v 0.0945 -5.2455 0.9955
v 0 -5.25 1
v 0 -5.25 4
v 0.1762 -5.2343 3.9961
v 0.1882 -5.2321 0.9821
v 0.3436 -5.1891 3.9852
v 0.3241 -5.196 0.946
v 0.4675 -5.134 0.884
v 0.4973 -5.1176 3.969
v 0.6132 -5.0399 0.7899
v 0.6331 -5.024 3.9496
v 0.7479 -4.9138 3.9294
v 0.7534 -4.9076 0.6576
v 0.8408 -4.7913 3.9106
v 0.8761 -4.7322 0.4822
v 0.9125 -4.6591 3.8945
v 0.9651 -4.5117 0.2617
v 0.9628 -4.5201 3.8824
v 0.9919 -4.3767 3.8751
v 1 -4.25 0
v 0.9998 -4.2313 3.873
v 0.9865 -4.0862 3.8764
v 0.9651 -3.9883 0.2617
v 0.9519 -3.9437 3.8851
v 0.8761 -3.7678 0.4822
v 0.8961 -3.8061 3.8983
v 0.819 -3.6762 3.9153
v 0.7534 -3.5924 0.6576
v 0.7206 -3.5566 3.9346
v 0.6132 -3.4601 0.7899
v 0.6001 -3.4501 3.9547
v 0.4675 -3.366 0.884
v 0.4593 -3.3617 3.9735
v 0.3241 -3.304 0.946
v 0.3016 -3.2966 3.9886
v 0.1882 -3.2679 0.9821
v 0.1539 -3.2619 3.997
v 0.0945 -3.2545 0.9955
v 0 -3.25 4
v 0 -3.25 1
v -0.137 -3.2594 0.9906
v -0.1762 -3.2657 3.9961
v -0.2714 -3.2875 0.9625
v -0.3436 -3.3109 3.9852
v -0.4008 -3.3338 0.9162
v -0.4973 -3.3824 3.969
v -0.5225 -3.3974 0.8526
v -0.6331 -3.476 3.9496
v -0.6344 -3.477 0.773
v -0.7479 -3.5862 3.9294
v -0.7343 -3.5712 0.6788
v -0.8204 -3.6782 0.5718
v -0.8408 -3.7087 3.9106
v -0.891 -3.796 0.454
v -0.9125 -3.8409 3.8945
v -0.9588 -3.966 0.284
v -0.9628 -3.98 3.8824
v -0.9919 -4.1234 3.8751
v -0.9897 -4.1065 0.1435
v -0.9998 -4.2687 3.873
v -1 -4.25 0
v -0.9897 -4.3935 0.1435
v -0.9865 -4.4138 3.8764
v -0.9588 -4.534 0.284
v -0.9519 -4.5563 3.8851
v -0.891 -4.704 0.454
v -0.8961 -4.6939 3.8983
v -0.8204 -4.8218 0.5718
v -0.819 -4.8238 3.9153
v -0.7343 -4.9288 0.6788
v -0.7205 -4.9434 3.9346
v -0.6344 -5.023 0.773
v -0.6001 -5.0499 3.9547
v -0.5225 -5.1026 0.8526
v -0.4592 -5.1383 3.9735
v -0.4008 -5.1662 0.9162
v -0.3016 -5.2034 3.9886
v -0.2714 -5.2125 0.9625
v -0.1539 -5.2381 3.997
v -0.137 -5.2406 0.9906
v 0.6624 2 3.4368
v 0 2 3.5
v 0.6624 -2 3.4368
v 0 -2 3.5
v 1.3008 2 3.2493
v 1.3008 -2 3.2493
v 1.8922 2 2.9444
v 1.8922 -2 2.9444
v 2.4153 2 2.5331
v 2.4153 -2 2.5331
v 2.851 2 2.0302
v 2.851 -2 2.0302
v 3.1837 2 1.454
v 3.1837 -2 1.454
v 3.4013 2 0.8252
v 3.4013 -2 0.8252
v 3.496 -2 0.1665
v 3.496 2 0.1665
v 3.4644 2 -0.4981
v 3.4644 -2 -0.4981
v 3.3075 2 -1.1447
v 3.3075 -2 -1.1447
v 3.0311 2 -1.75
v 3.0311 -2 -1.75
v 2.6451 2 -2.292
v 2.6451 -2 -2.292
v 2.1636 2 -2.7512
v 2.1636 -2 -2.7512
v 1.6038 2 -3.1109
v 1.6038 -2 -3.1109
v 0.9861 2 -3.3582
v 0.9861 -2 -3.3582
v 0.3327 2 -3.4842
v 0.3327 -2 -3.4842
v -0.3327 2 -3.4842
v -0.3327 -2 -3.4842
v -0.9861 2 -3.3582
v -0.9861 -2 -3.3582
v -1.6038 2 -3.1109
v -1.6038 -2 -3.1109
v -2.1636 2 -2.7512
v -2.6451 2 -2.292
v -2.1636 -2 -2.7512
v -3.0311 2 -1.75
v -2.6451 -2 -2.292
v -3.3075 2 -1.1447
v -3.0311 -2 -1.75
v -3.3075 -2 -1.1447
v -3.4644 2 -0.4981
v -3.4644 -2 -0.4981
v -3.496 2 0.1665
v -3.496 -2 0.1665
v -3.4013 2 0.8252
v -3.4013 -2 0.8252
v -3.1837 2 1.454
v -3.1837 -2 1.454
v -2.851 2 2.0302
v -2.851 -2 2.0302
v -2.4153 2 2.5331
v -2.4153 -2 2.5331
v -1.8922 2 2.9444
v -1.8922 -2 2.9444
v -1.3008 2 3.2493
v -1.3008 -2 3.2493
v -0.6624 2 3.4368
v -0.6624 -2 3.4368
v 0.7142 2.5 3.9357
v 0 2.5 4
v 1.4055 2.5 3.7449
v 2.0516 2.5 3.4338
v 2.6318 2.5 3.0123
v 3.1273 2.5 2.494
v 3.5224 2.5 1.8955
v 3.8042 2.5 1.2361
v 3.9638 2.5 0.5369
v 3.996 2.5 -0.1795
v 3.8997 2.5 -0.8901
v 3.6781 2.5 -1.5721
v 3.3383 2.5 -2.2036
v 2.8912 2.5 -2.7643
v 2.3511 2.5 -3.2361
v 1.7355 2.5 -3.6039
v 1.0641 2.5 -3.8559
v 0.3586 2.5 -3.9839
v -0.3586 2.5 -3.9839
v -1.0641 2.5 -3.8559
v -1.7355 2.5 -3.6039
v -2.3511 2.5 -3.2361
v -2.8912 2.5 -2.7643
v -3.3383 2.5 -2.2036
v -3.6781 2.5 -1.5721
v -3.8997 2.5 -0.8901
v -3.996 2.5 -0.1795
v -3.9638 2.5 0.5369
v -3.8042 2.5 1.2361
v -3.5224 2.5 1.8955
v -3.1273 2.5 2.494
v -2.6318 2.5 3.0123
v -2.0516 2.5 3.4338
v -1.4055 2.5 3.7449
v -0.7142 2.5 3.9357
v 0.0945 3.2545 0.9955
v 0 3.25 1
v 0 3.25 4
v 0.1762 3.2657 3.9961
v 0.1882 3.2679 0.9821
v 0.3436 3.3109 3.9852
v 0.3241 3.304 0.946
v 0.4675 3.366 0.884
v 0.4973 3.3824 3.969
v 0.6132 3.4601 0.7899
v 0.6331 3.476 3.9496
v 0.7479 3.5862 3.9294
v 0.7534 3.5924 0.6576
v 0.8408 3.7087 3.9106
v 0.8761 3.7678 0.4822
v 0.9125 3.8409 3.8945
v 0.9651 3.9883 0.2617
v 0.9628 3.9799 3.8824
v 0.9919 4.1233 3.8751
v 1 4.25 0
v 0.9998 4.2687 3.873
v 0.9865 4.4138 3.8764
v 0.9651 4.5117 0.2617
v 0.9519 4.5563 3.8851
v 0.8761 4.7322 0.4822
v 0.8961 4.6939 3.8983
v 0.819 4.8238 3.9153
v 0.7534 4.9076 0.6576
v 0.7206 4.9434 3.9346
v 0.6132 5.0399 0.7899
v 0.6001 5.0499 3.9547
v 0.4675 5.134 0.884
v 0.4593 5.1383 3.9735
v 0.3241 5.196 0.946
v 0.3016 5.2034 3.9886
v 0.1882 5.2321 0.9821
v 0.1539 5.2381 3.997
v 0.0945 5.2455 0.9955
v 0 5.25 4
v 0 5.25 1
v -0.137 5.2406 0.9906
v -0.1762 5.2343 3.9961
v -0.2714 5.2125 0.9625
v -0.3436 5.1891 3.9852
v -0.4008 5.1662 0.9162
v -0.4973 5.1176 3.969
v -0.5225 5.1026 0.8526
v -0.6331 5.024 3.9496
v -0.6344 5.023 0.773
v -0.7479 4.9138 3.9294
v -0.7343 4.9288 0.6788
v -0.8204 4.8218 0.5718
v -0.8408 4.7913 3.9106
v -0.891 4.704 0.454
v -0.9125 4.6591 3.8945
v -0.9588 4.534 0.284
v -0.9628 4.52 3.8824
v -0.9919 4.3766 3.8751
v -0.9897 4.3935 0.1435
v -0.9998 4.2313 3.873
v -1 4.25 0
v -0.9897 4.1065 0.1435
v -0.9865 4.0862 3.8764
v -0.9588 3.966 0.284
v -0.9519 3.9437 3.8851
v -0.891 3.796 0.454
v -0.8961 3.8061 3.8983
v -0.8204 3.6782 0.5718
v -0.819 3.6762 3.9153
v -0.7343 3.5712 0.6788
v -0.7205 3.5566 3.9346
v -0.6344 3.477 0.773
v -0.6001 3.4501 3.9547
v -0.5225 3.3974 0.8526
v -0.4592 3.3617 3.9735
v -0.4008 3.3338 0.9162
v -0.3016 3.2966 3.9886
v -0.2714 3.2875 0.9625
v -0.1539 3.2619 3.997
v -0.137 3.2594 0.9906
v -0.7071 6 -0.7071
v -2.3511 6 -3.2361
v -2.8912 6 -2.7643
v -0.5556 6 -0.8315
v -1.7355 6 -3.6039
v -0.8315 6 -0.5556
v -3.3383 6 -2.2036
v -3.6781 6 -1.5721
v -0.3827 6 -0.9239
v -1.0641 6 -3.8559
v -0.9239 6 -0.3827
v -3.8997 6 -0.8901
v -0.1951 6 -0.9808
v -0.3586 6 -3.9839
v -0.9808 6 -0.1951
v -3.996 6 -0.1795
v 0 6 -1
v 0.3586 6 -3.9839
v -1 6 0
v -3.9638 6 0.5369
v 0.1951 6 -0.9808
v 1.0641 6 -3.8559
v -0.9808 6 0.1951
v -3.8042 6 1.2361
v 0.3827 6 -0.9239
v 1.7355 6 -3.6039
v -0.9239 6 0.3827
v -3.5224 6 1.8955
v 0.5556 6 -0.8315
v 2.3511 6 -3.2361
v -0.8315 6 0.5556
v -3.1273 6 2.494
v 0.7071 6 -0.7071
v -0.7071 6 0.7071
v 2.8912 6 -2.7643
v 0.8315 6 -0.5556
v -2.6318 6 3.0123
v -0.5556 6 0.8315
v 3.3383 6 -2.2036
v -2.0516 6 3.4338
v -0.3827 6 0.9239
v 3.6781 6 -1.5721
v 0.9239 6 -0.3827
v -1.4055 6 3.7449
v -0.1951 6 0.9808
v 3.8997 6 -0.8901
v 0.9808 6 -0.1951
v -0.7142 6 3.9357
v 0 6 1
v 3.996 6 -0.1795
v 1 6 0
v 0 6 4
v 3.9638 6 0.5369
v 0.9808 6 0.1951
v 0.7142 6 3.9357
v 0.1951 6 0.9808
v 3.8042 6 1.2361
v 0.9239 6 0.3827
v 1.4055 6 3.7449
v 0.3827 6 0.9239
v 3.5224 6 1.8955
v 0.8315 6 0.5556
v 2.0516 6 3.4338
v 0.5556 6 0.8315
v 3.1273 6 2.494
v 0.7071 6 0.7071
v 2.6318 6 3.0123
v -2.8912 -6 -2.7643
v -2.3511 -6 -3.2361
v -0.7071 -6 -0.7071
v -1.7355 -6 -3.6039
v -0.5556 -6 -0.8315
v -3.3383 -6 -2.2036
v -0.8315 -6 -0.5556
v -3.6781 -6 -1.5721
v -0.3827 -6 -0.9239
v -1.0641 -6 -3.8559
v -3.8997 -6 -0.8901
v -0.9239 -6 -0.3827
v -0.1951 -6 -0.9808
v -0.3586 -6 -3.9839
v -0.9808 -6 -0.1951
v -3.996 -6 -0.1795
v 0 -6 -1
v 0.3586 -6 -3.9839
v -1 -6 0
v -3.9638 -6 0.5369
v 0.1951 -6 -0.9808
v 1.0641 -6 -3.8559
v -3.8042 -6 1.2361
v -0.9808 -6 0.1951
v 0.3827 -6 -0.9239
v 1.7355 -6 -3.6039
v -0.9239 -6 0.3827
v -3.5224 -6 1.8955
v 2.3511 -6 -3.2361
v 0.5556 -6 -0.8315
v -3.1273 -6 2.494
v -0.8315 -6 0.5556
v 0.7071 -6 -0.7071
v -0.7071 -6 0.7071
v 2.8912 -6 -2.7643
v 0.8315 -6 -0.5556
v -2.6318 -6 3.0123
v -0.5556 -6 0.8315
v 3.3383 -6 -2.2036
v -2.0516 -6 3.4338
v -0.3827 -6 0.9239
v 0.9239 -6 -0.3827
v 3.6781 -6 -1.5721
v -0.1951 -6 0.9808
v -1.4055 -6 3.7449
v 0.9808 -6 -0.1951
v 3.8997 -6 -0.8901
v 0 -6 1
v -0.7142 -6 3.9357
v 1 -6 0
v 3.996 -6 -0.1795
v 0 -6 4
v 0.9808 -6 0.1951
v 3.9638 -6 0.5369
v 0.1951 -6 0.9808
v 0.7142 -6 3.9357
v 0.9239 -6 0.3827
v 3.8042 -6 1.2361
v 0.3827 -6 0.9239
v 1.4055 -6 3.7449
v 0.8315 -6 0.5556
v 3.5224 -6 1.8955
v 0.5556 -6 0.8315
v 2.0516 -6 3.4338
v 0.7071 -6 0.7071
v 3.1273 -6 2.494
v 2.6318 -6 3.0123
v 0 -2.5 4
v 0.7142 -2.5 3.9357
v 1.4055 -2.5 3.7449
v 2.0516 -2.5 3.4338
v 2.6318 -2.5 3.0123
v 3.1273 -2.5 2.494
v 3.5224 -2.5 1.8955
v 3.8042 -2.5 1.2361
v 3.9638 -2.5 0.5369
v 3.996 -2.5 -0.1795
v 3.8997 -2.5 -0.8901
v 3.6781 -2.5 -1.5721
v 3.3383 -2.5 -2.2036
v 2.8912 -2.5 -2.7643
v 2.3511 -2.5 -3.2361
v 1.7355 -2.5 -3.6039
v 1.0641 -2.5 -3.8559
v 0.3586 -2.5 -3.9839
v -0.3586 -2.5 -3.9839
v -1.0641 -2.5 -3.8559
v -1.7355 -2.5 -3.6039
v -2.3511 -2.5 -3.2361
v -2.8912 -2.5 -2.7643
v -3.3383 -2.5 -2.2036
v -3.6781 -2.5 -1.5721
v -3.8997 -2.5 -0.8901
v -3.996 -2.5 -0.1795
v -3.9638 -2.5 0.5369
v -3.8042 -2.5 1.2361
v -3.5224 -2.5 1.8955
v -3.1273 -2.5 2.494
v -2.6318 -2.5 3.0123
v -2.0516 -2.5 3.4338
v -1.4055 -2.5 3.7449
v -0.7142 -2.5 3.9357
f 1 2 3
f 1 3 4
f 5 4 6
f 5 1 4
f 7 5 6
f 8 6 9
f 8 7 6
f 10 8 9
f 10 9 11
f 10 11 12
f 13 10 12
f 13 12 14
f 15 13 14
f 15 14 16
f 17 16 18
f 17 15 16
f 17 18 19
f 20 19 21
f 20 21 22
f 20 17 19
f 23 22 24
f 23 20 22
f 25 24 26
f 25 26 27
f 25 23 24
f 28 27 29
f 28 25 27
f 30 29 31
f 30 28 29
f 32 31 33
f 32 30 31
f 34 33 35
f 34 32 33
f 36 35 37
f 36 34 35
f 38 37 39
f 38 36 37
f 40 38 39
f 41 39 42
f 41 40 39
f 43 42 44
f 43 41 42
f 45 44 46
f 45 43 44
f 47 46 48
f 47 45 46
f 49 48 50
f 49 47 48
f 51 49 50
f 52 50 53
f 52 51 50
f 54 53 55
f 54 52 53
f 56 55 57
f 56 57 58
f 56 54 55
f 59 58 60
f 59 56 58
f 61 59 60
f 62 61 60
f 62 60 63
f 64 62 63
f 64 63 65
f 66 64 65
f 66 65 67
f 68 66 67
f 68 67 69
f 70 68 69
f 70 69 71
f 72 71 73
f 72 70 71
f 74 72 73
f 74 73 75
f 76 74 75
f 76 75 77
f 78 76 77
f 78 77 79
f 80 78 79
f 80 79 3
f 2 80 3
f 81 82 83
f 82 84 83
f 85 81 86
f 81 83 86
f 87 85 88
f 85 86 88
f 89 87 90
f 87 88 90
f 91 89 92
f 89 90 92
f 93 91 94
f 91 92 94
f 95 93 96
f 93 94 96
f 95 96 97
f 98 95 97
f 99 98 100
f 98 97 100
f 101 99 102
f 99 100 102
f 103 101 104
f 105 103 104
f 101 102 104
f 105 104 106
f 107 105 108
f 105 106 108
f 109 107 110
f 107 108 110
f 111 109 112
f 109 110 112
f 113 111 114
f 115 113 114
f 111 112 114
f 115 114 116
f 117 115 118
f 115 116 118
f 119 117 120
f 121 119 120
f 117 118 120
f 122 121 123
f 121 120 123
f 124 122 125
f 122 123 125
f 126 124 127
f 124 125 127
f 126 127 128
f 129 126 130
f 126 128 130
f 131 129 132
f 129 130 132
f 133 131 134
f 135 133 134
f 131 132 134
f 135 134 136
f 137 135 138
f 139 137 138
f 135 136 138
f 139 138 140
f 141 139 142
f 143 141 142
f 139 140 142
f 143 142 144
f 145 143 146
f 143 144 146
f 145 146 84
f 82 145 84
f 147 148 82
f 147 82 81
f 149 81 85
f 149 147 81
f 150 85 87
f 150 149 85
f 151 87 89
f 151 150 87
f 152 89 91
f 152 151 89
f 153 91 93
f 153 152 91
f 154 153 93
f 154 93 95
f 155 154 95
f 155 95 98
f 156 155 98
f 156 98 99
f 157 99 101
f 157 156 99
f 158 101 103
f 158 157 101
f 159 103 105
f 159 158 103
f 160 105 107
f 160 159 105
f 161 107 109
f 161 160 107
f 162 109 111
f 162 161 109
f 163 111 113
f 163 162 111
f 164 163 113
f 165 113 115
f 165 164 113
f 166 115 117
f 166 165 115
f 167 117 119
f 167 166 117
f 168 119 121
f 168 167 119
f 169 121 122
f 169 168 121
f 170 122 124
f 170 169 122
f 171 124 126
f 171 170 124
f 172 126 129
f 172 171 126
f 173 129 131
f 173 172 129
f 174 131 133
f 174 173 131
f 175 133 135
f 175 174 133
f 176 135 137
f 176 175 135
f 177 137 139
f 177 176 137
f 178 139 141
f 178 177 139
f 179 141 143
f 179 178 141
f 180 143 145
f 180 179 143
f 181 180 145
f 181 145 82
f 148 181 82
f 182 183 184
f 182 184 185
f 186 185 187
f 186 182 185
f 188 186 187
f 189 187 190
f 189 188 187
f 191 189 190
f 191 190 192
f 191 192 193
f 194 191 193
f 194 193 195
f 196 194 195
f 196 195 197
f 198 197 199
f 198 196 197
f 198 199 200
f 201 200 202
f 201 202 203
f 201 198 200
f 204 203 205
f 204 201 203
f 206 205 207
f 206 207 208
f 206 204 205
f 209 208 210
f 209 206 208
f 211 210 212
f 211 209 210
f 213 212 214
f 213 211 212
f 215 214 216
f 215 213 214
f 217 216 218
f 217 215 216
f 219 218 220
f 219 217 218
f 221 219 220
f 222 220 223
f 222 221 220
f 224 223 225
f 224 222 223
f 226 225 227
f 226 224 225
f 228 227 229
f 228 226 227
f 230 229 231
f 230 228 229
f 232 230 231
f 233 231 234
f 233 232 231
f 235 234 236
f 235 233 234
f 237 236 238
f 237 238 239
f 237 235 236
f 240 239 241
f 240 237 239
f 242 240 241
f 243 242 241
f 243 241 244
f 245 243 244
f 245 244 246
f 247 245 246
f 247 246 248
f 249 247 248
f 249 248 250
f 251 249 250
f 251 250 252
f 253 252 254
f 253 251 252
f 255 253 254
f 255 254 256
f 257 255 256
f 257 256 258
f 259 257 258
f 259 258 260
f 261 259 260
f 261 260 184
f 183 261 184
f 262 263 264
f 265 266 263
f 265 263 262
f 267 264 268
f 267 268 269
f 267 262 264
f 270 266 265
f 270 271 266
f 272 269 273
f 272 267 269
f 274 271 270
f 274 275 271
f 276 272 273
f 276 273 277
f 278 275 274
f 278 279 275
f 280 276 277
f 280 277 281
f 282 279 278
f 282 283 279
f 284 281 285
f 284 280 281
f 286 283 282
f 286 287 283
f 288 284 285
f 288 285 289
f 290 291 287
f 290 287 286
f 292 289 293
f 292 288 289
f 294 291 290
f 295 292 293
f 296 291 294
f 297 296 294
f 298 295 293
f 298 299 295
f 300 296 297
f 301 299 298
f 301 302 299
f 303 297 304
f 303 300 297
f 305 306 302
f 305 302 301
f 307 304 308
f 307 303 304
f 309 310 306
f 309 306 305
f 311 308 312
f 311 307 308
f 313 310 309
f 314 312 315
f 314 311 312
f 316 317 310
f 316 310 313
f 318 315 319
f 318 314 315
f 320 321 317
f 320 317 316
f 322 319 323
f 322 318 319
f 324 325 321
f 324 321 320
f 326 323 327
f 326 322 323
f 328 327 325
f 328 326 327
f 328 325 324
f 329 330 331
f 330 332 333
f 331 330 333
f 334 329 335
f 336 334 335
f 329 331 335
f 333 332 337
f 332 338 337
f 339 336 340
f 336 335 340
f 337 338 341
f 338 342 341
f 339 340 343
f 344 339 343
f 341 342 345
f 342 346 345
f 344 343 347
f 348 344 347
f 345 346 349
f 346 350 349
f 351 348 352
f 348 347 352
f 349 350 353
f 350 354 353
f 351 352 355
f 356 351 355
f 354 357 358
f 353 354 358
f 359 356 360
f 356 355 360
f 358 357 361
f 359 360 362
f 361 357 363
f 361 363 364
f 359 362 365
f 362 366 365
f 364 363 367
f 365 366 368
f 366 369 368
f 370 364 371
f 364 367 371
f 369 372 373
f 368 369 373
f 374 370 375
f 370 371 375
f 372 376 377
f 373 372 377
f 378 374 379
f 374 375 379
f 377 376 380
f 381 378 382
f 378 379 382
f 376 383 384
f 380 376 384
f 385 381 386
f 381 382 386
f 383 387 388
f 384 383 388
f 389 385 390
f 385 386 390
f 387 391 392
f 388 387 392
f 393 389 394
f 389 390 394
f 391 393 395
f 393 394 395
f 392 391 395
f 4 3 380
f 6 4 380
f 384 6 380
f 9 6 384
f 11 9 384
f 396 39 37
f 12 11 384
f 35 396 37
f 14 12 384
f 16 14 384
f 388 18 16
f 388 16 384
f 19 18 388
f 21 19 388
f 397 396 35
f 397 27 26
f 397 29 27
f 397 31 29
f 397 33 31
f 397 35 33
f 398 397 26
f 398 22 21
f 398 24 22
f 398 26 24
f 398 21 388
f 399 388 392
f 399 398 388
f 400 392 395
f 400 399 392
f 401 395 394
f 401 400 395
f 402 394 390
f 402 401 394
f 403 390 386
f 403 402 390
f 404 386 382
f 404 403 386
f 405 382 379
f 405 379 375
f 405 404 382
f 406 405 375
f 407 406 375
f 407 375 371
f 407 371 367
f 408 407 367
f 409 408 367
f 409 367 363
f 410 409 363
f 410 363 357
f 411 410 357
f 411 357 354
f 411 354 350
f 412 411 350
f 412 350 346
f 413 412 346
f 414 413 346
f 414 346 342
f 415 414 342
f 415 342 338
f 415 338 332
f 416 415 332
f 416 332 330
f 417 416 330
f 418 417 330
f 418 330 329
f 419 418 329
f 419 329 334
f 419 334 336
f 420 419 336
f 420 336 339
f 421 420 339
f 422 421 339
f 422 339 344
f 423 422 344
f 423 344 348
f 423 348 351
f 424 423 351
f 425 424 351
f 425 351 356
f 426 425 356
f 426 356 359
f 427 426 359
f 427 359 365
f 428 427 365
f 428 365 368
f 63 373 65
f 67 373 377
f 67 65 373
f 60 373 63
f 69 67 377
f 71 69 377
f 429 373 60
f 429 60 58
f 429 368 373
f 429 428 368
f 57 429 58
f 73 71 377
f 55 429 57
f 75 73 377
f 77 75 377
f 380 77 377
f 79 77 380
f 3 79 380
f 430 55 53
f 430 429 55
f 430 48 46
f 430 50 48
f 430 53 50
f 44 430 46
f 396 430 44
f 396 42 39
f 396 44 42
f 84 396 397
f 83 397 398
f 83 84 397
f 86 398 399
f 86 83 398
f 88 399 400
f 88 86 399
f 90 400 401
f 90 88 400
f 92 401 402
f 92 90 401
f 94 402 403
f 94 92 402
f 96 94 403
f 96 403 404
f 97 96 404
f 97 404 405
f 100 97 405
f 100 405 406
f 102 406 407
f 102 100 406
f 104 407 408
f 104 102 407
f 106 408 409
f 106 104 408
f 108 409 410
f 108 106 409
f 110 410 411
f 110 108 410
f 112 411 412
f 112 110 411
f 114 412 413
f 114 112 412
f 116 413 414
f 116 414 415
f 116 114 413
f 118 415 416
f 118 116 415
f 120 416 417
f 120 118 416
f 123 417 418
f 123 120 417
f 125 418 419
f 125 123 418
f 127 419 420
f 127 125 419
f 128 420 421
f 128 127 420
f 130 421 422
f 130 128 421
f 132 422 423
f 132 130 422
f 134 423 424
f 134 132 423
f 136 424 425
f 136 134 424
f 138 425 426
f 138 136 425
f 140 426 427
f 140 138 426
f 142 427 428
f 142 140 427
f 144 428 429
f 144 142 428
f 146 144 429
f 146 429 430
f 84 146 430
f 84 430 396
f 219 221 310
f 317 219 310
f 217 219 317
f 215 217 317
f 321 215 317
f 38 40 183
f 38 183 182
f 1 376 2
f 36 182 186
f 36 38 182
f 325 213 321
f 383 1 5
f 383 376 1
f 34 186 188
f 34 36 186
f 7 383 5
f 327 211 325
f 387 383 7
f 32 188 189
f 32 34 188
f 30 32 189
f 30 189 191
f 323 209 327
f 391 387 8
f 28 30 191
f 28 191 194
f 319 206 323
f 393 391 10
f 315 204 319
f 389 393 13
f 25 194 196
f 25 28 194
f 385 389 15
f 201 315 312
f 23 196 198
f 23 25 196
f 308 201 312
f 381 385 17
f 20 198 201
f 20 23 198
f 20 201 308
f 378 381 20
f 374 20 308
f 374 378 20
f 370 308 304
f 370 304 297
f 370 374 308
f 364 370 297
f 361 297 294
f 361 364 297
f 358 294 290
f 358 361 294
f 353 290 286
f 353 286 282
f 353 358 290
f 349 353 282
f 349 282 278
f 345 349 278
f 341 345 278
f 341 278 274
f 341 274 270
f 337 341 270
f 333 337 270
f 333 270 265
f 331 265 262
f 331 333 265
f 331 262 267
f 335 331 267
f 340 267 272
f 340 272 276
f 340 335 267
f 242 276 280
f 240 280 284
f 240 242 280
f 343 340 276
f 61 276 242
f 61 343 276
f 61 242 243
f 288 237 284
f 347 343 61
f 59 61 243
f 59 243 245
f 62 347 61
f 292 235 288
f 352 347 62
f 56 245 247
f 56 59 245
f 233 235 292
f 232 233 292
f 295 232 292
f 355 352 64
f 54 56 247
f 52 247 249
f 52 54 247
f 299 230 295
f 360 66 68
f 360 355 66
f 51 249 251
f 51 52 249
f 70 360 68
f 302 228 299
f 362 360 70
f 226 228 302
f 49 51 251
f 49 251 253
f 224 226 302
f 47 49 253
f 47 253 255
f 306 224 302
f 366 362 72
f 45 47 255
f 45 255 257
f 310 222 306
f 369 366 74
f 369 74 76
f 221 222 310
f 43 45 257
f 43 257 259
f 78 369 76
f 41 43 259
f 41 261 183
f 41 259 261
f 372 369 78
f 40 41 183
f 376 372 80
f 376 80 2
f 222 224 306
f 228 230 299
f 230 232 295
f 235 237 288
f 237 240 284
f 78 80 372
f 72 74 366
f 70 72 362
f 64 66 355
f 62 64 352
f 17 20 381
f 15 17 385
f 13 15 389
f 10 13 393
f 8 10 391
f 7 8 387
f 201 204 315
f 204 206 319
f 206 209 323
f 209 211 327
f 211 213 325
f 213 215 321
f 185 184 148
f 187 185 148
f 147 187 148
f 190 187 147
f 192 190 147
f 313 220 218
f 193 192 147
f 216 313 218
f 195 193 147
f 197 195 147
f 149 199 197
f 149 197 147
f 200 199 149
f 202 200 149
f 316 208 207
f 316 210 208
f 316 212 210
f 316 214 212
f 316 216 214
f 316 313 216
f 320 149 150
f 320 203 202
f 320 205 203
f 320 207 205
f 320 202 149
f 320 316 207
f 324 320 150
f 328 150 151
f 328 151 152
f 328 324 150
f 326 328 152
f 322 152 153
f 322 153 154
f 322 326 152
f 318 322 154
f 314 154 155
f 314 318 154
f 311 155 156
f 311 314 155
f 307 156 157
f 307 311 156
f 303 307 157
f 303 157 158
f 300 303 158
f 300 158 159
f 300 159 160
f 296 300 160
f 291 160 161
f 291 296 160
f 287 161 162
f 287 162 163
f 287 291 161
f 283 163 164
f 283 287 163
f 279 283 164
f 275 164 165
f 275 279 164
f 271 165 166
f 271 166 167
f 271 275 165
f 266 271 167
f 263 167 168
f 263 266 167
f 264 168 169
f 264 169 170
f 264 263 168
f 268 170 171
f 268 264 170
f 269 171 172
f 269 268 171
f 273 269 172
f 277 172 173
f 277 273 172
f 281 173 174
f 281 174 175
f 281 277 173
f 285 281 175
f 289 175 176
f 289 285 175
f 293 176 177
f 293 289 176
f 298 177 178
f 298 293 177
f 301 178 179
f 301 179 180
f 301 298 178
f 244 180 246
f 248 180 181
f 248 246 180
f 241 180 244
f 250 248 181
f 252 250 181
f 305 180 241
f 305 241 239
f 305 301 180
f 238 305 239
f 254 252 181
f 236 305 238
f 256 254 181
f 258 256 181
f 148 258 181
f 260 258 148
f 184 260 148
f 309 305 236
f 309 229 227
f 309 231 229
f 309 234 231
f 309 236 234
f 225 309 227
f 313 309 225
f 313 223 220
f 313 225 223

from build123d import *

# Parameters (mm, degrees)
SKETCH1_R           = 4
SKETCH1_R_2         = 1
BOSS_EXTRUDE1_DEPTH = 6
SKETCH2_R           = 10.066838553
SKETCH2_R_2         = 3.5
CUT_EXTRUDE1_DEPTH  = 3
CHAMFER1_SIZE       = 1
SKETCH3_R           = 1
CUT_EXTRUDE2_DEPTH  = 9.246211251


with BuildPart() as part:
    # Sketch1 → Boss-Extrude1 (new, symmetric)
    with BuildSketch(Plane(origin=(0, 0, 0), x_dir=(1, 0, 0), z_dir=(0, 1, 0))):
        with Locations(Location((0, 0, 0), (0, 0, 270))):
            Circle(SKETCH1_R)
        with Locations(Location((0, 0, 0), (0, 0, 270))):
            Circle(SKETCH1_R_2, mode=Mode.SUBTRACT)
    extrude(amount=BOSS_EXTRUDE1_DEPTH, both=True)

    # Sketch2 → Cut-Extrude1 (cut, symmetric)
    with BuildSketch(Plane(origin=(0, 0, 0), x_dir=(1, 0, 0), z_dir=(0, 1, 0))):
        Circle(SKETCH2_R)
        with Locations(Location((0, 0, 0), (0, 0, 270))):
            Circle(SKETCH2_R_2, mode=Mode.SUBTRACT)
    extrude(amount=CUT_EXTRUDE1_DEPTH, both=True, mode=Mode.SUBTRACT)

    # Chamfer1
    # the kernel refuses this chamfer: 1 mm, written as the material it adds along each edge
    with BuildSketch(Plane(origin=(0, -3, 0), x_dir=(0, 0, 1), z_dir=(-1, 0, 0))) as chamfer1_piece_1_section:
        Polygon((3.5 + CHAMFER1_SIZE, 0), (3.5, CHAMFER1_SIZE), (3.5, 0), align=None)
    chamfer1_piece_1 = revolve(axis=Axis((0, -3, 0), (0, 1, 0)), mode=Mode.PRIVATE)
    chamfer1_piece_1 = chamfer1_piece_1 & Plane(origin=(0, -2.250849305, 0), x_dir=(0, 0, 1), z_dir=(0, 1, 0)) * Cylinder(4, 18, mode=Mode.PRIVATE)
    add(chamfer1_piece_1)
    with BuildSketch(Plane(origin=(0, 3, 0), x_dir=(0, 0, 1), z_dir=(-1, 0, 0))) as chamfer1_piece_2_section:
        Polygon((3.5, -CHAMFER1_SIZE), (3.5 + CHAMFER1_SIZE, 0), (3.5, 0), align=None)
    chamfer1_piece_2 = revolve(axis=Axis((0, 3, 0), (0, 1, 0)), mode=Mode.PRIVATE)
    chamfer1_piece_2 = chamfer1_piece_2 & Plane(origin=(0, 2.250849305, 0), x_dir=(0, 0, 1), z_dir=(0, 1, 0)) * Cylinder(4, 18, mode=Mode.PRIVATE)
    add(chamfer1_piece_2)

    # Sketch3 → Cut-Extrude2 (cut, through all)
    with BuildSketch(Plane.XY):
        with Locations(Location((0, 4.25, 0), (0, 0, 270))):
            Circle(SKETCH3_R)
        with Locations(Location((0, -4.25, 0), (0, 0, 270))):
            Circle(SKETCH3_R)
    extrude(amount=CUT_EXTRUDE2_DEPTH, mode=Mode.SUBTRACT)


solid = part.part
